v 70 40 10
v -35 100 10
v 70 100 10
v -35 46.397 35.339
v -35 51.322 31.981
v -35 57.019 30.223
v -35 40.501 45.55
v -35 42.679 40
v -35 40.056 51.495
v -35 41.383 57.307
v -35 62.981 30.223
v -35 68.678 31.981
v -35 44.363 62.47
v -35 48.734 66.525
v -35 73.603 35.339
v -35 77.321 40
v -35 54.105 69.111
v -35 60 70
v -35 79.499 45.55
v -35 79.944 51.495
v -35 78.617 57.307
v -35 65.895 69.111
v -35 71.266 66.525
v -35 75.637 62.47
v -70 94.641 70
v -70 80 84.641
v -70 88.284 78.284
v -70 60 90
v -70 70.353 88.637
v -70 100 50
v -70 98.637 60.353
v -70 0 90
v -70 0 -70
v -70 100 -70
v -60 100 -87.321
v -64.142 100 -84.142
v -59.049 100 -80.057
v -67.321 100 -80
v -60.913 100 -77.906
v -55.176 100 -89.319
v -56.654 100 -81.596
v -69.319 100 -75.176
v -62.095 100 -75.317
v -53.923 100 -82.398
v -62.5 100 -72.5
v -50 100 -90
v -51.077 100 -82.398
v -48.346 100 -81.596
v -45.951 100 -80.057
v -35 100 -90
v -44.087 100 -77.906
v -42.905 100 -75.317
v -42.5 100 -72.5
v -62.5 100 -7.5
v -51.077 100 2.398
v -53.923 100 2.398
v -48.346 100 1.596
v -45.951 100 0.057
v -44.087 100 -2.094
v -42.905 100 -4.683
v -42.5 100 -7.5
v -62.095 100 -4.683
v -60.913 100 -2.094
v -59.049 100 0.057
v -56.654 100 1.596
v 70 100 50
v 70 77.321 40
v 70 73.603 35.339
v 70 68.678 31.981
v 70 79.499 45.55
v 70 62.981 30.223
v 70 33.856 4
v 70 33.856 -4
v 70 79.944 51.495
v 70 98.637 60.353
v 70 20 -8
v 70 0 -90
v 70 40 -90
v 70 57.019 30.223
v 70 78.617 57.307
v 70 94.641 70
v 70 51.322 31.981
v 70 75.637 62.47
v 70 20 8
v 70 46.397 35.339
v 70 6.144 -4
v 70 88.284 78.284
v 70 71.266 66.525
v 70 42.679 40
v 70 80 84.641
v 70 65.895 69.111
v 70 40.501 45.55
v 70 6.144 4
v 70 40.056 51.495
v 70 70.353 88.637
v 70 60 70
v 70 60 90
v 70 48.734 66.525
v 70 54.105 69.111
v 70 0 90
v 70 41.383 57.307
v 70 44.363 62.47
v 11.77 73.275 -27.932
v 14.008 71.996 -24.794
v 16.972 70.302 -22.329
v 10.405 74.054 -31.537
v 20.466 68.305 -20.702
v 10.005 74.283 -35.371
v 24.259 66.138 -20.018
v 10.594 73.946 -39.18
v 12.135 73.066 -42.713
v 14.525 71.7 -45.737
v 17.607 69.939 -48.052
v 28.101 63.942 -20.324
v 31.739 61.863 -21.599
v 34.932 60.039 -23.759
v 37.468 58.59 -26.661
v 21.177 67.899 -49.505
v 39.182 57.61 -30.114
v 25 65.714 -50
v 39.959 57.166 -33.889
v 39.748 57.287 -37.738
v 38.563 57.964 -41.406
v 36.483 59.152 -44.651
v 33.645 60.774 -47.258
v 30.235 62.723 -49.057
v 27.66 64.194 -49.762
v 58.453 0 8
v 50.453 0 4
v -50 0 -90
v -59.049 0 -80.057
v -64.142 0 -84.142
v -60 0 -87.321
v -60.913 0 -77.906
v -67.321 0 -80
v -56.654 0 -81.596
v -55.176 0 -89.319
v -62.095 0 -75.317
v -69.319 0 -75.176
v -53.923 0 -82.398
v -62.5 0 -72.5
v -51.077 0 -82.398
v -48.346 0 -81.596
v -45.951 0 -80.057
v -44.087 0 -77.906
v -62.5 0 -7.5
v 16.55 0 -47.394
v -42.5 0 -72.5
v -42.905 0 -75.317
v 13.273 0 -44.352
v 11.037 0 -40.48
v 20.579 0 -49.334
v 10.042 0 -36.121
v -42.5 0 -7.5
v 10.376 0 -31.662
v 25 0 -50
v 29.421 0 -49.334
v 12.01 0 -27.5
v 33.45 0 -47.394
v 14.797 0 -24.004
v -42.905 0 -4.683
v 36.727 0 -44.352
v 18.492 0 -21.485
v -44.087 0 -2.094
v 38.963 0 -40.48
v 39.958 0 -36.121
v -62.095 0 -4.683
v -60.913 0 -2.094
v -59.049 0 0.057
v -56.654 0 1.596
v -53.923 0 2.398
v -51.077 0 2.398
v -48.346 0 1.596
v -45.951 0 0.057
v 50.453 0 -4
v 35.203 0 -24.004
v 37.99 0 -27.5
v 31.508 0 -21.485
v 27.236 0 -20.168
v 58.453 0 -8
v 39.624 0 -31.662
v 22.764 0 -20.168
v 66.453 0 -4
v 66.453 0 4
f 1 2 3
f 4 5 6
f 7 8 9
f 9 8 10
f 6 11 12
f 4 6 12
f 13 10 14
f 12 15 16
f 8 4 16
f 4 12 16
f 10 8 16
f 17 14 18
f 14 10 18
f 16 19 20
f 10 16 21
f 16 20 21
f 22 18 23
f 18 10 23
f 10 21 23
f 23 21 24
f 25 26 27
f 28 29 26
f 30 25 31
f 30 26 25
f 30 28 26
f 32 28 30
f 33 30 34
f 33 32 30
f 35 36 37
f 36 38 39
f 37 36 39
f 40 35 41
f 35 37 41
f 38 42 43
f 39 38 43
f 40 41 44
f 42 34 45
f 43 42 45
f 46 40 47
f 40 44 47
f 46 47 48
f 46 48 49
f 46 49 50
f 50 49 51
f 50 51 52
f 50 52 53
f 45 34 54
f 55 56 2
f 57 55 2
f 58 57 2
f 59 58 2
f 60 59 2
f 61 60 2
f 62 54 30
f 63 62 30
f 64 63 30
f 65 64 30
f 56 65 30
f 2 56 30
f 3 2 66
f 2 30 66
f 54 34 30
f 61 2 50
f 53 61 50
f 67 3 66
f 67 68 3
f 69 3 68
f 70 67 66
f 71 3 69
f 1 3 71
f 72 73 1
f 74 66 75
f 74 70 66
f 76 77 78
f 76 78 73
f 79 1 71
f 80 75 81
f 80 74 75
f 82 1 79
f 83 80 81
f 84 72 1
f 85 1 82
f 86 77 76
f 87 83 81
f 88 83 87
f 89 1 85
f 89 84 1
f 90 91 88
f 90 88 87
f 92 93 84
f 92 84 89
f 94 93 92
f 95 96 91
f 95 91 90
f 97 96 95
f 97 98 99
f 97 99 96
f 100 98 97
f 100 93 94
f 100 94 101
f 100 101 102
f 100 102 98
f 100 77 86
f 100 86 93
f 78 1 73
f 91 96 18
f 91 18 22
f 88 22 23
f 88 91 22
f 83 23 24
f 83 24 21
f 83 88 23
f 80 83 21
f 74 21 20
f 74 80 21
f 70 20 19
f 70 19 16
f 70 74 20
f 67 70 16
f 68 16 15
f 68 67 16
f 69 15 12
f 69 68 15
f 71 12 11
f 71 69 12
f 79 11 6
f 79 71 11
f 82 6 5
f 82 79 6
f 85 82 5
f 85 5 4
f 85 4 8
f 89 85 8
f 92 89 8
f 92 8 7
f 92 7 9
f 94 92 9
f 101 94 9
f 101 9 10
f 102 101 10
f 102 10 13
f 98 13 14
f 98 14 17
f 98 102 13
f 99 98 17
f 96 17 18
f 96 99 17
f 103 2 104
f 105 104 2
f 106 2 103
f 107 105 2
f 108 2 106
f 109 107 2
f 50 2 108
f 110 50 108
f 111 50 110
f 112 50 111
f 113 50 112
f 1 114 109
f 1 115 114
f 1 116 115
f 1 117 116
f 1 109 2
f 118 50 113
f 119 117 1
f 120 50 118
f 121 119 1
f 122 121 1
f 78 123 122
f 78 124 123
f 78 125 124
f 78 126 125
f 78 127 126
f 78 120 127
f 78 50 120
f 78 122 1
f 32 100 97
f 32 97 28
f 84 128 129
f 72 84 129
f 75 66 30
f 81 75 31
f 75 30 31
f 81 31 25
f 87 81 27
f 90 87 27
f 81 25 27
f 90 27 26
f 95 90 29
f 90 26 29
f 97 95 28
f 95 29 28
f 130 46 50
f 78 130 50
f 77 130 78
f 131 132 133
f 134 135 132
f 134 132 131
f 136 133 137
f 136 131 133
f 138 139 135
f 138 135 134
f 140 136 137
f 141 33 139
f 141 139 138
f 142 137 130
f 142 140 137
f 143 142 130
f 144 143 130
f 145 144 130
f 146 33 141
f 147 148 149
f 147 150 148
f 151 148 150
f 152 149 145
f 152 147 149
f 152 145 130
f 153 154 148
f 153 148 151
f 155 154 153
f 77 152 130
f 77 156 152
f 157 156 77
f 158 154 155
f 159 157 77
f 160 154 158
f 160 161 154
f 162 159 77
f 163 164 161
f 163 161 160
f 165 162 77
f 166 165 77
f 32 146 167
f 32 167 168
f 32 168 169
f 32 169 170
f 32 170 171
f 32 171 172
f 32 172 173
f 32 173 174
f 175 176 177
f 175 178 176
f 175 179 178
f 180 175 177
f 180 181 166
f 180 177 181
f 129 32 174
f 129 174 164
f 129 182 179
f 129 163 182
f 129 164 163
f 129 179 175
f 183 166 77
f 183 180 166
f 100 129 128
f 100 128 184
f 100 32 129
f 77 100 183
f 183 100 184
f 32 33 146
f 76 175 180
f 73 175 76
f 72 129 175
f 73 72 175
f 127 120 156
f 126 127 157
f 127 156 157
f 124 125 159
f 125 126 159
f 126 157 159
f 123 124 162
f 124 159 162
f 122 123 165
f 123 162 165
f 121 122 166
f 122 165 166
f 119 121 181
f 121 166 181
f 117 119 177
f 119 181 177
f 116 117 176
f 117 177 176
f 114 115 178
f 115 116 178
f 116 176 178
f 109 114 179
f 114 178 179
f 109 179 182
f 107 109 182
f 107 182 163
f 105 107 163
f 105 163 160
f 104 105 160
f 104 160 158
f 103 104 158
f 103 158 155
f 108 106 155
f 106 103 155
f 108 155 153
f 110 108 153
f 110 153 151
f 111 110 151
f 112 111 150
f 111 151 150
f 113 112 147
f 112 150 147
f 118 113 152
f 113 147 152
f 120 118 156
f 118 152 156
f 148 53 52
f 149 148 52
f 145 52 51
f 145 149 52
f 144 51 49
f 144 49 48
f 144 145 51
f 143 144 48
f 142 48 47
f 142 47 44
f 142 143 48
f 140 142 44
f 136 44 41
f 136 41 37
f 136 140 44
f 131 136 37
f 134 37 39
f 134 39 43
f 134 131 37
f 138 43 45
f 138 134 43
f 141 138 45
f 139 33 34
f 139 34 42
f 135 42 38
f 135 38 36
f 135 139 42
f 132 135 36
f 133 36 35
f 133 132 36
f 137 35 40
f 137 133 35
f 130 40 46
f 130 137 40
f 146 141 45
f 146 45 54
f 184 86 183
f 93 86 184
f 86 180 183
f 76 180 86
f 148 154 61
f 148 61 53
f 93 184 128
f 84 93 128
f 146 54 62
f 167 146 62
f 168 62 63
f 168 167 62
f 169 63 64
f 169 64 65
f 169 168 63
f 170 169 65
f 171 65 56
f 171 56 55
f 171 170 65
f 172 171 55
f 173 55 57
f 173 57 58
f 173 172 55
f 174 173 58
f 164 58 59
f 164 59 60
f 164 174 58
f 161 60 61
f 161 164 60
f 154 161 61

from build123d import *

# Parameters (mm, degrees)
SKETCH1_R           = 15
BOSS_EXTRUDE1_DEPTH = 100
CUT_EXTRUDE1_DEPTH  = 100
FILLET1_R           = 40
SKETCH3_R           = 20
CUT_EXTRUDE2_DEPTH  = 105
CUT_EXTRUDE3_DEPTH  = 191.523897853


with BuildPart() as part:
    # Sketch1 → Boss-Extrude1 (new body)
    with BuildSketch(Plane(origin=(0, 0, 0), x_dir=(1, 0, 0), z_dir=(0, 1, 0))):
        with BuildLine():
            Line((-50, -90), (70, -90))
            Line((70, -90), (70, 90))
            Line((70, 90), (-70, 90))
            Line((-70, 90), (-70, -70))
            ThreePointArc((-70, -70), (-64.142135624, -84.142135624), (-50, -90))
        make_face()
        with Locations(Location((25, -35, 0), (0, 0, 270))):
            Circle(SKETCH1_R, mode=Mode.SUBTRACT)
        with BuildLine():
            Line((-42.5, -7.5), (-42.5, -72.5))
            ThreePointArc((-42.5, -72.5), (-52.5, -82.5), (-62.5, -72.5))
            Line((-62.5, -72.5), (-62.5, -7.5))
            ThreePointArc((-62.5, -7.5), (-52.5, 2.5), (-42.5, -7.5))
        make_face(mode=Mode.SUBTRACT)
    extrude(amount=BOSS_EXTRUDE1_DEPTH)

    # Sketch2 → Cut-Extrude1 (cut)
    with BuildSketch(Plane.XY.offset(90)):
        Polygon((-35, 100), (70, 40), (70, 100), align=None)
    extrude(amount=-CUT_EXTRUDE1_DEPTH, mode=Mode.SUBTRACT)

    # Fillet1
    fillet1_edges = [part.edges().sort_by_distance(p)[0] for p in [
        (0, 100, -90),
    ]]
    fillet(fillet1_edges, radius=FILLET1_R)

    # Sketch3 → Cut-Extrude2 (cut)
    with BuildSketch(Plane(origin=(70, 0, 0), x_dir=(0, 0, -1), z_dir=(1, 0, 0))):
        with Locations((50, 60)):
            Circle(SKETCH3_R)
    extrude(amount=-CUT_EXTRUDE2_DEPTH, mode=Mode.SUBTRACT)

    # Sketch6 → Cut-Extrude3 (cut, through all)
    with BuildSketch(Plane(origin=(60.801270189, 105.310889132, 0), x_dir=(0, 0, -1), z_dir=(0.499999999999998, 0.8660254037844398, 0))):
        Polygon((8, -50.621778265), (4, -43.693575035), (-4, -43.693575035), (-8, -50.621778265), (-4, -57.549981495), (4, -57.549981495), align=None)
    extrude(amount=-CUT_EXTRUDE3_DEPTH, mode=Mode.SUBTRACT)


with BuildPart() as body_2:
    # Mirror1: mirrored copy
    add(part.part.mirror(Plane(origin=(-50, 100, 90), x_dir=(1, 0, 0), z_dir=(0, 0, -1))))


with BuildPart() as body_2_1:
    # Body-Move/Copy2: moved
    add(body_2.part.moved(Location((0, 0, -180))))


solid = body_2_1.part
